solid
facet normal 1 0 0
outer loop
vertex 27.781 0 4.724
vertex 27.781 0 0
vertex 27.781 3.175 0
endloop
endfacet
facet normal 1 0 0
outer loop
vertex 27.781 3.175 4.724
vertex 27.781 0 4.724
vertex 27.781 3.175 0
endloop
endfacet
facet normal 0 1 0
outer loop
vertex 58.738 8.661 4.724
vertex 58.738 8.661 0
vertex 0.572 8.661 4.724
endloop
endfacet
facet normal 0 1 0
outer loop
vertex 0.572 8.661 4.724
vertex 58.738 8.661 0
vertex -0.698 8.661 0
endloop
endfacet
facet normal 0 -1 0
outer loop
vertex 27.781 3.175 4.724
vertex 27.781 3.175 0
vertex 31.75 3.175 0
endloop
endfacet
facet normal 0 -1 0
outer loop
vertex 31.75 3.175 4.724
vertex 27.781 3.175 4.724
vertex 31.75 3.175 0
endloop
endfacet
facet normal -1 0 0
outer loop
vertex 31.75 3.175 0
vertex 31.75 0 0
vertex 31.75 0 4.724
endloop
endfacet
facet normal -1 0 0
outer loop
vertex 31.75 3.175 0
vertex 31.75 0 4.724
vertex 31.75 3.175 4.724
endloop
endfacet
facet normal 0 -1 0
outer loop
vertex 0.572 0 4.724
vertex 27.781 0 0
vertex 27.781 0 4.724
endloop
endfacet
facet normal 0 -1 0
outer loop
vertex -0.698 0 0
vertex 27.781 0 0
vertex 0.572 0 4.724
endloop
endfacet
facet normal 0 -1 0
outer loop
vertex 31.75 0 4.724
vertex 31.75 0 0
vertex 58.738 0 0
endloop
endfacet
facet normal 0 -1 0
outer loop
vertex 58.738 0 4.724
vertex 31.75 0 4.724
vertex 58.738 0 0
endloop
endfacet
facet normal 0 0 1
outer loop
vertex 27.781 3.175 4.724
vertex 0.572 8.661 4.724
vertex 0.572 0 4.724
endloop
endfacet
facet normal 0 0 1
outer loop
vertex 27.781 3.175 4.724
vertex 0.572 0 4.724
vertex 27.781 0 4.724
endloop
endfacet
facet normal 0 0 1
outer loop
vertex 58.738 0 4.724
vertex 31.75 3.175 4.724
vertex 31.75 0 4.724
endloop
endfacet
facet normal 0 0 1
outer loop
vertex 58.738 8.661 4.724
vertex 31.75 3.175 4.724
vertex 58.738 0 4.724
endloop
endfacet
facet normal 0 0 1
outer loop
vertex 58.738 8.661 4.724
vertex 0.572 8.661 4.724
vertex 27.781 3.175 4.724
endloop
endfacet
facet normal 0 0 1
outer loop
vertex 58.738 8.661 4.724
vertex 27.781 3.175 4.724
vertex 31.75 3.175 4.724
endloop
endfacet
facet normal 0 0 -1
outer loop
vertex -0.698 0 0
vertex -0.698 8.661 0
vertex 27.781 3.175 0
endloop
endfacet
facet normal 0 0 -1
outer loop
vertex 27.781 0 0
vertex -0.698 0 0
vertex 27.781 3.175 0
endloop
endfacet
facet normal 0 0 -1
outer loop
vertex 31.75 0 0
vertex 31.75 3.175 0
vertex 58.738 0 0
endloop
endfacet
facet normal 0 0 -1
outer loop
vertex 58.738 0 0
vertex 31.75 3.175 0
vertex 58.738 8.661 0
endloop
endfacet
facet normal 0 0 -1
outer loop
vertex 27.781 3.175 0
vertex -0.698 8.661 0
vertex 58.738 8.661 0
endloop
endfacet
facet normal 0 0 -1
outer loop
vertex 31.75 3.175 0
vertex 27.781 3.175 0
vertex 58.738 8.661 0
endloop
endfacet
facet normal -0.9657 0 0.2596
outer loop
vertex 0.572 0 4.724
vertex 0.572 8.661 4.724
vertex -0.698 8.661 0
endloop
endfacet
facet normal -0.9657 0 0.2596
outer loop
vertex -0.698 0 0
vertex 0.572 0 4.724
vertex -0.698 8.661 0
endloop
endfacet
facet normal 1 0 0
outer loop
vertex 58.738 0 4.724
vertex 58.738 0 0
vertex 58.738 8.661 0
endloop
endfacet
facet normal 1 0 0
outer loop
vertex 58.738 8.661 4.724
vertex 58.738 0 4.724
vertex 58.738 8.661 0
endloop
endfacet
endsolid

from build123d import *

# Parameters (mm, degrees)
CROQUIS1_W                 = 58.7375
CROQUIS1_H                 = 8.6614
SALIENTE_EXTRUIR1_DEPTH    = 4.7244
CORTAR_EXTRUIR2_DEPTH      = 60.560336732
CORTAR_EXTRUIR2_DEPTH_BACK = 60.560336732
CROQUIS2_W                 = 3.96875
CROQUIS2_H                 = 3.175
CORTAR_EXTRUIR4_DEPTH      = 60.560336732
SALIENTE_EXTRUIR2_DEPTH    = 8.6614


with BuildPart() as part:
    # Croquis1 → Saliente-Extruir1 (new body)
    with BuildSketch(Plane.XY):
        with Locations((29.36875, 4.3307)):
            Rectangle(CROQUIS1_W, CROQUIS1_H)
    extrude(amount=SALIENTE_EXTRUIR1_DEPTH)

    # Croquis2 → Cortar-Extruir2 (cut, two sides: drawn at the far end of the back side and taken through both)
    with BuildSketch(Plane.XY.offset(-CORTAR_EXTRUIR2_DEPTH_BACK)):
        with Locations((29.765625, 1.5875)):
            Rectangle(CROQUIS2_W, CROQUIS2_H)
    extrude(amount=CORTAR_EXTRUIR2_DEPTH + CORTAR_EXTRUIR2_DEPTH_BACK, mode=Mode.SUBTRACT)

    # Croquis4 → Cortar-Extruir4 (cut, through all)
    with BuildSketch(Plane(origin=(0, 8.6614, 0), x_dir=(1, 0, 0), z_dir=(0, 1, 0))):
        Polygon((0.5715, -4.7244), (0, -4.7244), (0, -2.223247059), align=None)
    extrude(amount=-CORTAR_EXTRUIR4_DEPTH, mode=Mode.SUBTRACT)

    # Croquis5 → Saliente-Extruir2 (add)
    with BuildSketch(Plane(origin=(0, 8.6614, 0), x_dir=(1, 0, 0), z_dir=(0, 1, 0))):
        Polygon((-0.6985, 0), (0.28575, 0), (0.5715, -4.7244), align=None)
    extrude(amount=-SALIENTE_EXTRUIR2_DEPTH)


solid = part.part
